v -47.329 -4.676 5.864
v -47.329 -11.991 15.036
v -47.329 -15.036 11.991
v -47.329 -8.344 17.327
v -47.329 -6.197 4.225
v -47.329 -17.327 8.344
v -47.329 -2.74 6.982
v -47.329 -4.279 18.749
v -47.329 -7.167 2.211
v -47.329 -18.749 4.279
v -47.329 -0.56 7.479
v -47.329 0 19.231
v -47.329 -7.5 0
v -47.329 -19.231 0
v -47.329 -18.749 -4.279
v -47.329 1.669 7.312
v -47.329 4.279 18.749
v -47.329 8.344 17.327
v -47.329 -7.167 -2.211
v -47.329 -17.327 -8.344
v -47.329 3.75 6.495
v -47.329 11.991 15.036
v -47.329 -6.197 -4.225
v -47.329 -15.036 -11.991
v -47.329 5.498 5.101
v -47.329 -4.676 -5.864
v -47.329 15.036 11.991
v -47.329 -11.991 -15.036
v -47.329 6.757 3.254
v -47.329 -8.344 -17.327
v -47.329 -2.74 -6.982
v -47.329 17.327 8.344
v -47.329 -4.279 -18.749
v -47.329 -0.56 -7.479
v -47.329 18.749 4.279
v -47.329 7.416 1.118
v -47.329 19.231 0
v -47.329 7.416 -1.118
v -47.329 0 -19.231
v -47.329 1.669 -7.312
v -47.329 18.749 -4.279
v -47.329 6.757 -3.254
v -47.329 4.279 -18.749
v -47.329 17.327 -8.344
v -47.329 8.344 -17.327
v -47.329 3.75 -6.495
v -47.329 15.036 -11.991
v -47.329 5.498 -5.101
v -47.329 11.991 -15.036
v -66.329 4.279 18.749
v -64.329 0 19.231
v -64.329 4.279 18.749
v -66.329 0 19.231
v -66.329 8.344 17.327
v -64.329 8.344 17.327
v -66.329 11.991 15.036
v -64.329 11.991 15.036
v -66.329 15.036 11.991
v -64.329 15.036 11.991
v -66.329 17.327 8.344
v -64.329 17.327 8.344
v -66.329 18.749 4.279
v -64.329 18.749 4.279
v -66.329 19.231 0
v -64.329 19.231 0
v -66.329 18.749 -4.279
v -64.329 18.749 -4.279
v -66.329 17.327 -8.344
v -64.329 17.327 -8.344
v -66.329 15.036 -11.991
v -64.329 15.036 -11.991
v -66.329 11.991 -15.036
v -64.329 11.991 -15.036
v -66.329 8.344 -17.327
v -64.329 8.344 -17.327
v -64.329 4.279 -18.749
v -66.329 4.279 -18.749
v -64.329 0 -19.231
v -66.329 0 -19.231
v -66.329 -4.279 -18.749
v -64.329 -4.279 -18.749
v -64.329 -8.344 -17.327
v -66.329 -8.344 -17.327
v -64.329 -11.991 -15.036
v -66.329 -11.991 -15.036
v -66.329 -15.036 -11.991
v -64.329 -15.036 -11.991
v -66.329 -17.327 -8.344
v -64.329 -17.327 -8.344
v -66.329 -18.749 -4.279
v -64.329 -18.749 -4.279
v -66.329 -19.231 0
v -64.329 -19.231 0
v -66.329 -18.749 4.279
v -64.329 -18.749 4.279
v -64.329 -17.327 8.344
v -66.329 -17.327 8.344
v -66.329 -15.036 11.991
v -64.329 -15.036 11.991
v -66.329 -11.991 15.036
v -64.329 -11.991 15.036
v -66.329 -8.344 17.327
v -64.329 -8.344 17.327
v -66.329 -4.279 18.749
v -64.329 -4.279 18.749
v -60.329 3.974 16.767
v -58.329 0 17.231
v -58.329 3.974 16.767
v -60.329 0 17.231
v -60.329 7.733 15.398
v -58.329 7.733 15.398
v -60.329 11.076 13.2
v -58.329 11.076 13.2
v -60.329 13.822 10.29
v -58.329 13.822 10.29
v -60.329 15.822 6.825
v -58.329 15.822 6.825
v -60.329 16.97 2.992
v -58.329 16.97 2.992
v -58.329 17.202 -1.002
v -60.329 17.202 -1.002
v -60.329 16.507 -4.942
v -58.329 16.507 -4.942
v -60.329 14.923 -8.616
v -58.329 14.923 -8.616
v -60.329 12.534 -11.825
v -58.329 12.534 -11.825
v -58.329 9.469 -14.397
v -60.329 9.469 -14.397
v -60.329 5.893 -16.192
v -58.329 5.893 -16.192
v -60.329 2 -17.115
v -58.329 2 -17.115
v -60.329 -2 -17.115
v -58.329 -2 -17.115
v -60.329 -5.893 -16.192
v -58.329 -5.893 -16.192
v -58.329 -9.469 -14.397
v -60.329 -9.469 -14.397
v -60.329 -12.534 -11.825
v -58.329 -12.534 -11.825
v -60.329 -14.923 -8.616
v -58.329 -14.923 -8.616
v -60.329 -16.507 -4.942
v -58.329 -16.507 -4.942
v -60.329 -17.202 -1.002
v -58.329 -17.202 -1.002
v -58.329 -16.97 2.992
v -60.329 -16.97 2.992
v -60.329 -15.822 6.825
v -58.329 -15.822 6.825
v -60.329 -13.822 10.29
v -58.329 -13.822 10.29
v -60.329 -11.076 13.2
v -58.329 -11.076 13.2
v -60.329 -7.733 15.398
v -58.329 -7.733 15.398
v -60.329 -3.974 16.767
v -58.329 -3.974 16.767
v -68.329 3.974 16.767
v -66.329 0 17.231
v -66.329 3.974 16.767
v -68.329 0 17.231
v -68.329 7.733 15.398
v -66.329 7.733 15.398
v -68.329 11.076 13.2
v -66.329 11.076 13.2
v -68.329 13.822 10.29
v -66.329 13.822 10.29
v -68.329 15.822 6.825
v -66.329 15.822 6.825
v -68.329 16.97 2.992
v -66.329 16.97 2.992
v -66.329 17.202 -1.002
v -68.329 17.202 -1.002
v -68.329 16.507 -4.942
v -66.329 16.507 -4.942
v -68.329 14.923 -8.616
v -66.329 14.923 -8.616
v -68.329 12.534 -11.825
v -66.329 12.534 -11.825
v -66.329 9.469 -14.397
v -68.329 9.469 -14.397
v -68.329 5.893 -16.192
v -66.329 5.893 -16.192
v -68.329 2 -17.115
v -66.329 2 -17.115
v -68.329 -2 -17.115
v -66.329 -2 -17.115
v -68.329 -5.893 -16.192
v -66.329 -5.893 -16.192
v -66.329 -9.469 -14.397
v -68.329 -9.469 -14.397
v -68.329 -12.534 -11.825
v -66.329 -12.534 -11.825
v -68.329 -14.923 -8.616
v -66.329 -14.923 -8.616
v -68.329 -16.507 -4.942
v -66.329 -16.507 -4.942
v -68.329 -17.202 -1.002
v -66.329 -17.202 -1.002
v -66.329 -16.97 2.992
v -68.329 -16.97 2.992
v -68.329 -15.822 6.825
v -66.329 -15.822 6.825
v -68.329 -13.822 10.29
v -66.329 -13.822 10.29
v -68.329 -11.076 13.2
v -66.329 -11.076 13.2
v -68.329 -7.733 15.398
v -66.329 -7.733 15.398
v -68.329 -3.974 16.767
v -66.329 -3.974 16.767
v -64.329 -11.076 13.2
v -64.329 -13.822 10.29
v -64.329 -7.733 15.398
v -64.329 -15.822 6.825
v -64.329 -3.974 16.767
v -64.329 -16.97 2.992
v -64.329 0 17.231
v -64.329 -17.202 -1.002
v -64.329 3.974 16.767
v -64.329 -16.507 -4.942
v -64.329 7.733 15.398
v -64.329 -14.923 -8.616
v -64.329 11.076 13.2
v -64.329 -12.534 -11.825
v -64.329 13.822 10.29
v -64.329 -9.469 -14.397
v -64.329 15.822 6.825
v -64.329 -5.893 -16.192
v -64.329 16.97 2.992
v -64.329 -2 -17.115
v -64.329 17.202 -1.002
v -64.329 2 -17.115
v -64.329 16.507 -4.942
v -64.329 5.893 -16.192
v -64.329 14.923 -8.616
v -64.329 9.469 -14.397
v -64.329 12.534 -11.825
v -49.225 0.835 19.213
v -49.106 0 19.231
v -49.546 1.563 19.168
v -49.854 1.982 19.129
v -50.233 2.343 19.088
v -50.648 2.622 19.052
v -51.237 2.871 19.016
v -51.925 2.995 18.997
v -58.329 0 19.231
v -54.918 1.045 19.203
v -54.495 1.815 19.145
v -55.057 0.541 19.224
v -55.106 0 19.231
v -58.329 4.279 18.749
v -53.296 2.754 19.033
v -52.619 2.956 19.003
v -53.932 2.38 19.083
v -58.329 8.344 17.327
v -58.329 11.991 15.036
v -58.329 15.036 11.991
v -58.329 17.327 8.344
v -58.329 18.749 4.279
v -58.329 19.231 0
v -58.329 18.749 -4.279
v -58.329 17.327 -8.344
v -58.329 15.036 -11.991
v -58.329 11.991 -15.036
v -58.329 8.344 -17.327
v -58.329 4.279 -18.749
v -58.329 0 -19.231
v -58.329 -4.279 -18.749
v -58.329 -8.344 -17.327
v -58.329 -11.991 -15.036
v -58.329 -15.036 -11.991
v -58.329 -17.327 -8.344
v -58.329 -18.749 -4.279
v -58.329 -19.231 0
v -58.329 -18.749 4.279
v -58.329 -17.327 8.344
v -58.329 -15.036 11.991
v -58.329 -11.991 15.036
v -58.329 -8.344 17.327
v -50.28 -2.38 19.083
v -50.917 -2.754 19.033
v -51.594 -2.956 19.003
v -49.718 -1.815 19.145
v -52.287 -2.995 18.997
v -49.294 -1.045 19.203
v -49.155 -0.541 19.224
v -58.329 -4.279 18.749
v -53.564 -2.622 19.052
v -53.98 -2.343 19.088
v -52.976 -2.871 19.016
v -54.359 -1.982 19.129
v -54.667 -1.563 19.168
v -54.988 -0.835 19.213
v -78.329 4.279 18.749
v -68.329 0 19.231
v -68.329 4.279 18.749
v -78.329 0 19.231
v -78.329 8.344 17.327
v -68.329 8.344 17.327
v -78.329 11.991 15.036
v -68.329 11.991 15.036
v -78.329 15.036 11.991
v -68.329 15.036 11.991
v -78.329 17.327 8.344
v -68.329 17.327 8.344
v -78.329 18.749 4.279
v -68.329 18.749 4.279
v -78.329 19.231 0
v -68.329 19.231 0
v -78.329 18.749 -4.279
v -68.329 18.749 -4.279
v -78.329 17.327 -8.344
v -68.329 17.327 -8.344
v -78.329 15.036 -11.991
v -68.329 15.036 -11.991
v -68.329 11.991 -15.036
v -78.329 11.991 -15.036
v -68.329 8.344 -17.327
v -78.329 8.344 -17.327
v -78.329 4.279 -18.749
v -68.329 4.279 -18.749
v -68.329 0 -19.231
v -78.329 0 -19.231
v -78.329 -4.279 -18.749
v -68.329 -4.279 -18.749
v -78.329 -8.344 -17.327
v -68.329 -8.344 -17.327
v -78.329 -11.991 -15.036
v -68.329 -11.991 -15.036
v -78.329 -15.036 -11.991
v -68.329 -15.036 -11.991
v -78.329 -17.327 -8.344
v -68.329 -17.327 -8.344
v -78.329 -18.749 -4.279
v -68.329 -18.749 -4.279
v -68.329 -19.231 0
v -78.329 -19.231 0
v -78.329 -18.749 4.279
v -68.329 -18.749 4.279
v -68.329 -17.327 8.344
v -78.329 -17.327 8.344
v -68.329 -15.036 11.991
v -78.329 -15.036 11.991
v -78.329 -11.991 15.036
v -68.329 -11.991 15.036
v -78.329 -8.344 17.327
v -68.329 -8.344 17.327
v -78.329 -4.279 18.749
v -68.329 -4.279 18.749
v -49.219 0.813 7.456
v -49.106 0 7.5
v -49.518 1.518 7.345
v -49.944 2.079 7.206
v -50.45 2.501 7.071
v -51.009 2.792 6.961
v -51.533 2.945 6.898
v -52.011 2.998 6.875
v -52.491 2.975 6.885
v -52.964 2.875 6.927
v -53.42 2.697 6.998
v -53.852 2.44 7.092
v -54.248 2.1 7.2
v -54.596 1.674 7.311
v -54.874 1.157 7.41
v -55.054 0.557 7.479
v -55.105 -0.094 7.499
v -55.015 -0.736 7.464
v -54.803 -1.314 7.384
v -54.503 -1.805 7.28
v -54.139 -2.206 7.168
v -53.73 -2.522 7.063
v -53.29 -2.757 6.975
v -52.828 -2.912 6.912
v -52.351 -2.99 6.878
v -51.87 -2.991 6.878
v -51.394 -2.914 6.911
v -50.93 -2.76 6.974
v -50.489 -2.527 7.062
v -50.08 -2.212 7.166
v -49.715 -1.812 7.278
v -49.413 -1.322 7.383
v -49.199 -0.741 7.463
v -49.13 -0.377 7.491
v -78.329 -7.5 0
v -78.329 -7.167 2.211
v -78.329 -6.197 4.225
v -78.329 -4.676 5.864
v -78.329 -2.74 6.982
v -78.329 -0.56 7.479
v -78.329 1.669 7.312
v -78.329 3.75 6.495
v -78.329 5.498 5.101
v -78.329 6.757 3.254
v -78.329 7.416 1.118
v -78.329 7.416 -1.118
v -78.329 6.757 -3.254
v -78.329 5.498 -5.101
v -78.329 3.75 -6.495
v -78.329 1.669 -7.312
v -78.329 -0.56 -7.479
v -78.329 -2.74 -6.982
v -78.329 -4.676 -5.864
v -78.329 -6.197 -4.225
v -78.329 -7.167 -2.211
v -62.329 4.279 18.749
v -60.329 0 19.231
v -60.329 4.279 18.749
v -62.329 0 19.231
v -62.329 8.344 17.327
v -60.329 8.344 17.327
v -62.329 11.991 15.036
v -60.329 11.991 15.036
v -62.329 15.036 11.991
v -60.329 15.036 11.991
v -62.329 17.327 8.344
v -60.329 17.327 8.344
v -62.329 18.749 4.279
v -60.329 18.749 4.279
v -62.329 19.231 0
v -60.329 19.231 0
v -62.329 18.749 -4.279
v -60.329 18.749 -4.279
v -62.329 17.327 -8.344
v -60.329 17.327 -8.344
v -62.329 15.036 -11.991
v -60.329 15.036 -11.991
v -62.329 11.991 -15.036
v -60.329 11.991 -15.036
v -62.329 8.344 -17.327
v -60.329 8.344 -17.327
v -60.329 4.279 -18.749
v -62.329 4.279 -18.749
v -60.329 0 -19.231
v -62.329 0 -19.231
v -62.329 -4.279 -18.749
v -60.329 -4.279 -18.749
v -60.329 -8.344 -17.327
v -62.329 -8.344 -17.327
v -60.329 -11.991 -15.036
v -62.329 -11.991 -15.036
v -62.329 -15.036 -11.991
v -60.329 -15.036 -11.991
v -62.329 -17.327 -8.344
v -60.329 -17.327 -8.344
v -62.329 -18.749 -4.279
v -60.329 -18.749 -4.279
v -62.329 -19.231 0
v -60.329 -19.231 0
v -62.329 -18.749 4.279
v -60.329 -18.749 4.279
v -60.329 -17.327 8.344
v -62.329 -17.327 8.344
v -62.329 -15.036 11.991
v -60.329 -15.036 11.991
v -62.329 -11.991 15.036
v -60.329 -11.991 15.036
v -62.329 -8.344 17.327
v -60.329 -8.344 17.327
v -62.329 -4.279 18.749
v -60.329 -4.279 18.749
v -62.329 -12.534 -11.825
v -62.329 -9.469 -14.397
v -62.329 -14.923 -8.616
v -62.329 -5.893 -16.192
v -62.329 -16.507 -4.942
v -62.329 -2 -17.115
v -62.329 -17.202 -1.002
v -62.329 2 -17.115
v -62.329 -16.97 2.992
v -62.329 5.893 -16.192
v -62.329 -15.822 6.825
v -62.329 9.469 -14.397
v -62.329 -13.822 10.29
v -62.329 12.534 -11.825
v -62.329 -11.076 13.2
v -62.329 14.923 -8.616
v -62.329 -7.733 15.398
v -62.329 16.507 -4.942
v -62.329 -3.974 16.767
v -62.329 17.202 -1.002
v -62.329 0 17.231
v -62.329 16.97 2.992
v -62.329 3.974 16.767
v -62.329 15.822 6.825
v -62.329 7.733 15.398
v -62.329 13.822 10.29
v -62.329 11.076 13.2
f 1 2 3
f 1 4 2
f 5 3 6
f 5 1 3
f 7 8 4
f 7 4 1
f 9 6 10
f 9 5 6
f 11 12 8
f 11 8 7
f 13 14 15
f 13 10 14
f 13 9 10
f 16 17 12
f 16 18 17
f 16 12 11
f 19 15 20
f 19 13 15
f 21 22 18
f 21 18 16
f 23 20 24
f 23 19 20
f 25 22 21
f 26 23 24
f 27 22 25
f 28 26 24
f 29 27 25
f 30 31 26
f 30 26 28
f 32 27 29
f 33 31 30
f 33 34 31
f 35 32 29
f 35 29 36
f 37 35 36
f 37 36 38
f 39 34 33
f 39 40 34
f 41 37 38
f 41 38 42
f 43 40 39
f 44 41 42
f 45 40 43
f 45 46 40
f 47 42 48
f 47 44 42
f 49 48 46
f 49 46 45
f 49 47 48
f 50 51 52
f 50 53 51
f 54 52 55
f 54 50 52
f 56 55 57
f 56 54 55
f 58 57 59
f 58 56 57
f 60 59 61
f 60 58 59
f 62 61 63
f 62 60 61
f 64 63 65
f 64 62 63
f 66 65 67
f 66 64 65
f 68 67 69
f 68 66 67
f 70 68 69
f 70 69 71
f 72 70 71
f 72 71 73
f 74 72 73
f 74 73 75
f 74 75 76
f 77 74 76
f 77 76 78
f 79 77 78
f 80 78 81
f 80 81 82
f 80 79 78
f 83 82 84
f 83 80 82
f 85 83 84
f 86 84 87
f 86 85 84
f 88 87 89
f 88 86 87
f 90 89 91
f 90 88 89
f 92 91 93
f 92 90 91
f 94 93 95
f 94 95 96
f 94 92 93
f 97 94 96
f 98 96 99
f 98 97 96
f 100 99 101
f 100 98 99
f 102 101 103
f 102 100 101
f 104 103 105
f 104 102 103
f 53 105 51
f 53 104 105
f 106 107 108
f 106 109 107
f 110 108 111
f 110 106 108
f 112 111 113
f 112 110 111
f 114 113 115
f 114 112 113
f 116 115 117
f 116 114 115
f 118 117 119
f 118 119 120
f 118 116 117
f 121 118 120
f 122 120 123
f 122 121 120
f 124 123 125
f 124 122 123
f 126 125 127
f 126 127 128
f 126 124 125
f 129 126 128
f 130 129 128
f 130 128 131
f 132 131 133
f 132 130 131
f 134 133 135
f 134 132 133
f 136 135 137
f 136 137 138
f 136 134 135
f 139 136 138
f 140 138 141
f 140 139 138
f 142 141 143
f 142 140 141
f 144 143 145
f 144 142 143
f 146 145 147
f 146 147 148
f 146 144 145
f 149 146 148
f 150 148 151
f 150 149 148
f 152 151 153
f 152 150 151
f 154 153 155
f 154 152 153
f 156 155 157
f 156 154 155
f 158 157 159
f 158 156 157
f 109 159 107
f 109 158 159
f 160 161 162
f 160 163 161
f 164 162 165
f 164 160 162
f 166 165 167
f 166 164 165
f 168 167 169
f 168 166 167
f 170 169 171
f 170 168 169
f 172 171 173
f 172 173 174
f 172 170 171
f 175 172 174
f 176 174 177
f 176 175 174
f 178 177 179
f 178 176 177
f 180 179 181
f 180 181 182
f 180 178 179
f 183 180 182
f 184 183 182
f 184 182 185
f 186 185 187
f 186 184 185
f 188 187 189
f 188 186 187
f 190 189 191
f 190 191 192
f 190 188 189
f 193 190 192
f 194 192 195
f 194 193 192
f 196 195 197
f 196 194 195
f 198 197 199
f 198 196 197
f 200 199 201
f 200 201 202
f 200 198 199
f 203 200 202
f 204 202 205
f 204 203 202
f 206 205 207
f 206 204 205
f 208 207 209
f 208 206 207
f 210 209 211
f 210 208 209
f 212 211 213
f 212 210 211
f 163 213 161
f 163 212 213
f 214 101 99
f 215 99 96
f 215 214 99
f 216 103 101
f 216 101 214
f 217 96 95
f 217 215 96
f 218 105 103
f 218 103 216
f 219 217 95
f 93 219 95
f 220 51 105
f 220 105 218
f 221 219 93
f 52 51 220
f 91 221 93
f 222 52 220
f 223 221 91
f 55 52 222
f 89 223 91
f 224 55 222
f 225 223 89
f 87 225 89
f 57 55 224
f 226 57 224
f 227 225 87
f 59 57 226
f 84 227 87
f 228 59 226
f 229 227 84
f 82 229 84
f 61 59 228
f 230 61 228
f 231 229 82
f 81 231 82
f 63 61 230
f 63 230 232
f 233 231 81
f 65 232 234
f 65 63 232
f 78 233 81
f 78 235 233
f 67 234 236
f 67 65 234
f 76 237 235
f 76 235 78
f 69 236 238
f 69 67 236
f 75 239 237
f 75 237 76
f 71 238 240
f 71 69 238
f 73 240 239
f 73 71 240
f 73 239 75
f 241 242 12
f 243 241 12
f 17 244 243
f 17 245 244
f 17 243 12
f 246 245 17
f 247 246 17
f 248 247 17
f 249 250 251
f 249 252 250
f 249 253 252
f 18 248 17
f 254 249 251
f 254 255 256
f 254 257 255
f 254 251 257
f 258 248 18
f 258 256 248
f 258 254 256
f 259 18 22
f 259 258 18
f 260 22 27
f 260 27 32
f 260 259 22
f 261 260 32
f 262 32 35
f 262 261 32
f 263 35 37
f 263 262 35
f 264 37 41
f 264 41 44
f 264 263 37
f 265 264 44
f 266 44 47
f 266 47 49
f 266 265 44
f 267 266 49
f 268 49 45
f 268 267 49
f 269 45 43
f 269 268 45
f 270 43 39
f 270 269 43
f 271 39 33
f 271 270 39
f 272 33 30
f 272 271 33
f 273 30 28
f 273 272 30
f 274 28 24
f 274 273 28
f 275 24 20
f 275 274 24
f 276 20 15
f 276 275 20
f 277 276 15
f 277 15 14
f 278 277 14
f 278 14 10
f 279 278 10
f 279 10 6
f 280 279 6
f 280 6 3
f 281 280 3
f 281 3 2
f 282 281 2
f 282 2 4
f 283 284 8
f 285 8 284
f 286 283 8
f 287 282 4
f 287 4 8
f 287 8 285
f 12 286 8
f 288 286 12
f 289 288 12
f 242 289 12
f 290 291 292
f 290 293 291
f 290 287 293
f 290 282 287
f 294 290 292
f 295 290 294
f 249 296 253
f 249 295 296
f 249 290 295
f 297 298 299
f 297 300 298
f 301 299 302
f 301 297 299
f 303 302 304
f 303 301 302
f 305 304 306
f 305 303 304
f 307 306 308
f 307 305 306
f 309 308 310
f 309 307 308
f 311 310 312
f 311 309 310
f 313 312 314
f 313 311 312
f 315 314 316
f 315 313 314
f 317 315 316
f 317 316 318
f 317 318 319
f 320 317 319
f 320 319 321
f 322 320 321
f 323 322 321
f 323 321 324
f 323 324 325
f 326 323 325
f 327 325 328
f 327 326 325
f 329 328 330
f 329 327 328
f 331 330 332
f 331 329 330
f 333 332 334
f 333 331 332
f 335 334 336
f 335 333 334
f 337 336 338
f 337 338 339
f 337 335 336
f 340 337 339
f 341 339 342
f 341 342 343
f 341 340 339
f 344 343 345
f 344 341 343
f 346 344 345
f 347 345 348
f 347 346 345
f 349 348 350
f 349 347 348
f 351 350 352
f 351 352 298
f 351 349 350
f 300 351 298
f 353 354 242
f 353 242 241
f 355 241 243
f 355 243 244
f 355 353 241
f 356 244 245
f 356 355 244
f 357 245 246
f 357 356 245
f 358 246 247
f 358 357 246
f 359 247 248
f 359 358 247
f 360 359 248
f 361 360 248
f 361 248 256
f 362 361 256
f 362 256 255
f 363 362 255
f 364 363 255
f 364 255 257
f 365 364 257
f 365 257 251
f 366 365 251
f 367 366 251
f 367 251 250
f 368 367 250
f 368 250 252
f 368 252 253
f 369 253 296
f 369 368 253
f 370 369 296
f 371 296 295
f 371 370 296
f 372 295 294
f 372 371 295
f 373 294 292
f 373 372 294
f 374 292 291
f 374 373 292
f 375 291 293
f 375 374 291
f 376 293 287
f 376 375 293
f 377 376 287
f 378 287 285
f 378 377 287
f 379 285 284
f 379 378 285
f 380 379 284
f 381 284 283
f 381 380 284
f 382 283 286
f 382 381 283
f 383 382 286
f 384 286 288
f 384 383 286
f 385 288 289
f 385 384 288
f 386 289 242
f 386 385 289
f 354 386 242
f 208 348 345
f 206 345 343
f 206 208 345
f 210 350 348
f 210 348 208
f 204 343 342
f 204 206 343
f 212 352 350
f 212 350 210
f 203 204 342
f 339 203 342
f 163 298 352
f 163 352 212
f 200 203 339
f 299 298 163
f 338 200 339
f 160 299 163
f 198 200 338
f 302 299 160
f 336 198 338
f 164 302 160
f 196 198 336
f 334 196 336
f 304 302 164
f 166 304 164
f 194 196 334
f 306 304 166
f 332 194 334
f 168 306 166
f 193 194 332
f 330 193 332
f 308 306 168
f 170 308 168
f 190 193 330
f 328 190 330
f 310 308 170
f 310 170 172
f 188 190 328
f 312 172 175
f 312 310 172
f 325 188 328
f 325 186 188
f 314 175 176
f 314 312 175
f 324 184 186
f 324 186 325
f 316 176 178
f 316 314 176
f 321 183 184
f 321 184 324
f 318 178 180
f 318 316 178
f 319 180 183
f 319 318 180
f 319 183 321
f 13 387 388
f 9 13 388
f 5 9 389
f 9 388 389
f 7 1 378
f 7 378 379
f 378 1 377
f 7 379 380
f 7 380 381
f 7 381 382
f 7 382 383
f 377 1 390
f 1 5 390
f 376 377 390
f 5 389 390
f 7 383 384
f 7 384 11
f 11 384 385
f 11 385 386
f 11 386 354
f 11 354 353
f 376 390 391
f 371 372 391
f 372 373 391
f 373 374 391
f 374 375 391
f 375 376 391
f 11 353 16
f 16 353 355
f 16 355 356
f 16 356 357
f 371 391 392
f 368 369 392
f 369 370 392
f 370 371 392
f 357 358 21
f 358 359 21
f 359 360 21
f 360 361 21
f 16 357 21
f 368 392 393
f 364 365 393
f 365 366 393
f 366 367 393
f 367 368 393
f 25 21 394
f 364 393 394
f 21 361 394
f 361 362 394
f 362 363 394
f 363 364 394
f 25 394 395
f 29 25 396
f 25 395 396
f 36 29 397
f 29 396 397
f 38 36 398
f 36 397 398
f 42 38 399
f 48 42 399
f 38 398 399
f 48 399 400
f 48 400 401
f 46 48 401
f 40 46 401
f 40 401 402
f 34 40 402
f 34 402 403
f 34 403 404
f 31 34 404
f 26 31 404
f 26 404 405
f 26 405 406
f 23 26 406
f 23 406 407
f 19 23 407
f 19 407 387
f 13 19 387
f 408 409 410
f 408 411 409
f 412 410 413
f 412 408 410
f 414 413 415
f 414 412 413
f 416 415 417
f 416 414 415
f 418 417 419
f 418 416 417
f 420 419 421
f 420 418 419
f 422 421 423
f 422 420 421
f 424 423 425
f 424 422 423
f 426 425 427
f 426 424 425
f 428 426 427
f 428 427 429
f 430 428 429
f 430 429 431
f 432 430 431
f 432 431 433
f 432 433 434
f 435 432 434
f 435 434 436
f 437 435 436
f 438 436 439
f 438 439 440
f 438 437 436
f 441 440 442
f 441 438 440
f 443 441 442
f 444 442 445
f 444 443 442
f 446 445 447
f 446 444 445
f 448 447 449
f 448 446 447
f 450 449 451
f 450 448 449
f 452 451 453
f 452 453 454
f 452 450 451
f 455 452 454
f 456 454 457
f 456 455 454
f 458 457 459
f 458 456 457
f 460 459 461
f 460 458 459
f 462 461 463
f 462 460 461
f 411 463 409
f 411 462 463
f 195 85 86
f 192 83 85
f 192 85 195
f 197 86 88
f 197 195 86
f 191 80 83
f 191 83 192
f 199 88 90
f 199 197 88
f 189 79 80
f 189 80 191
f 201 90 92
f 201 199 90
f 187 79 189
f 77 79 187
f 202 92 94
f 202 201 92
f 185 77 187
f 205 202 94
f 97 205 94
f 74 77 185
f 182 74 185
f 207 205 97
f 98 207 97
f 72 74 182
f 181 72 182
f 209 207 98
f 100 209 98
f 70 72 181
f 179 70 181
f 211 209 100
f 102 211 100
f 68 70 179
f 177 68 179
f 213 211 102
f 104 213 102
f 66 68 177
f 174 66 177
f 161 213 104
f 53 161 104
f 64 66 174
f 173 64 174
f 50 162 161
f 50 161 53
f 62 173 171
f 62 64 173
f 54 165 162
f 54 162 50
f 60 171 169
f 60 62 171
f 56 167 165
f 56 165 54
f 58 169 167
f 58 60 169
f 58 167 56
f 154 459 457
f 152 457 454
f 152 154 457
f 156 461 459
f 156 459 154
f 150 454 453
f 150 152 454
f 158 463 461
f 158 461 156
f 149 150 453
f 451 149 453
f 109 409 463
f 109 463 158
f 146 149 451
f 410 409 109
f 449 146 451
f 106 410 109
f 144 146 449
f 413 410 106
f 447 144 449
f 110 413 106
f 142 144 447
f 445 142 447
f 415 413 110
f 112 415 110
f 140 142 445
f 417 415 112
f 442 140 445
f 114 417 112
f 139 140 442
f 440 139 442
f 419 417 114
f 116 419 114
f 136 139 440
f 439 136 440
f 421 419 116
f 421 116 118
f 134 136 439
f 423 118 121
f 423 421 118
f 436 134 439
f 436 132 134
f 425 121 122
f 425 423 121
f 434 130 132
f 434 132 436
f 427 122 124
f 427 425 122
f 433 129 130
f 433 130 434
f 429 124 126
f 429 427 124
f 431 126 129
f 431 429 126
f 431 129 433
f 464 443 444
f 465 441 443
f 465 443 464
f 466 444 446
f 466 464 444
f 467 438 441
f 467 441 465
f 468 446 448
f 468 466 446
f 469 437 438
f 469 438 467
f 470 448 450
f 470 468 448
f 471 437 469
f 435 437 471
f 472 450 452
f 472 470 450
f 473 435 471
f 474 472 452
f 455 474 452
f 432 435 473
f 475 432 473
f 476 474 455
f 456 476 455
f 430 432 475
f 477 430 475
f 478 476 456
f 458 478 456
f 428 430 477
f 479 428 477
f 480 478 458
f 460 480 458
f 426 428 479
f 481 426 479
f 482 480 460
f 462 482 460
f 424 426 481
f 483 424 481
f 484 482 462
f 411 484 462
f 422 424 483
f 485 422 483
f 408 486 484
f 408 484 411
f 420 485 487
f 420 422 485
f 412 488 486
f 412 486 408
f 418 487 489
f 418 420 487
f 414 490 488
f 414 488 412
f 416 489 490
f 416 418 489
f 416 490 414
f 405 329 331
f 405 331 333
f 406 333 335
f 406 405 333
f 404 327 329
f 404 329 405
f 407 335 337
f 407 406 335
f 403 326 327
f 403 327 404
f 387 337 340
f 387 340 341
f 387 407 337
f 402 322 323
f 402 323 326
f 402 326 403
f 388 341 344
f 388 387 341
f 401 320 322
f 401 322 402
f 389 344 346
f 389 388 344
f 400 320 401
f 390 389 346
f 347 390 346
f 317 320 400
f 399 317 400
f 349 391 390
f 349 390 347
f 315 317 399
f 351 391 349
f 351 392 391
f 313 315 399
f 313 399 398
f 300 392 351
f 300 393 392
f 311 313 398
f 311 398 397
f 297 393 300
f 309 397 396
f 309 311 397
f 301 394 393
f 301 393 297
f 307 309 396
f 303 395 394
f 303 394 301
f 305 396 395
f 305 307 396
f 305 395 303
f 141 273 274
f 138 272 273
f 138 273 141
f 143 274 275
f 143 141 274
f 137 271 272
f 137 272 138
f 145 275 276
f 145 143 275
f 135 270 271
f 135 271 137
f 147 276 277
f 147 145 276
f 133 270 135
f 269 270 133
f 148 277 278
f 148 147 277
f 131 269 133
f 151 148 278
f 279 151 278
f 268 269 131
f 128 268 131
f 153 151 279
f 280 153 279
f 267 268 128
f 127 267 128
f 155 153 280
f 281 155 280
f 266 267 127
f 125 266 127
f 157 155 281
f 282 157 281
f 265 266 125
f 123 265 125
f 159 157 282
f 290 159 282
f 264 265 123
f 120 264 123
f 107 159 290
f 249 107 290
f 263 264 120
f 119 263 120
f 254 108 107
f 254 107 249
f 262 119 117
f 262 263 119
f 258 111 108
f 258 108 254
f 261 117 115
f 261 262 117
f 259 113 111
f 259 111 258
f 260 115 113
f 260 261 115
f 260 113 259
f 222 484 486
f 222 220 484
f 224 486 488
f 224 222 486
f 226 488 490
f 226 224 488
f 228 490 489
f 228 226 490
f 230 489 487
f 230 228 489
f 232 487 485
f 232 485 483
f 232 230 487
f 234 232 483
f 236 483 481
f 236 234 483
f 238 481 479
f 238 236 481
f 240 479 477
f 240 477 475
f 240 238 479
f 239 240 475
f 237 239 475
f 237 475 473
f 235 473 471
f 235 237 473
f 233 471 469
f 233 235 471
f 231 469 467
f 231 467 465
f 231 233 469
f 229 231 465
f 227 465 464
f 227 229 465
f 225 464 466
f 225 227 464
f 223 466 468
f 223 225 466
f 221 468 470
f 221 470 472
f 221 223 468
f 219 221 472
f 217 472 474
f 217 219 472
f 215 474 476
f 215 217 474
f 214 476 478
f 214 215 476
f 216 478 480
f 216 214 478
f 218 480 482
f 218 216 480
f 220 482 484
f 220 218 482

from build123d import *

# Parameters (mm, degrees)
F2_R     = 7.5
F3_DEPTH = 40
F4_R     = 3
F5_DEPTH = 25


with BuildPart() as f1:
    # F0 (on Front) → F1 (revolve)
    with BuildSketch(Plane.XZ):
        Polygon((-78.328885, 0), (-47.328885, 0), (-47.328885, 19.231284), (-58.328885, 19.231284), (-58.328885, 17.231284), (-60.328885, 17.231284), (-60.328885, 19.231284), (-62.328885, 19.231284), (-62.328885, 17.231284), (-64.328885, 17.231284), (-64.328885, 19.231284), (-66.328885, 19.231284), (-66.328885, 17.231284), (-68.328885, 17.231284), (-68.328885, 19.231284), (-78.328885, 19.231284), align=None)
    revolve(axis=Axis((-39.164443, 0, 0), (-1, 0, 0)))

    # F2 (on face) → F3 (cut)
    with BuildSketch(Plane(origin=(-78.328885, 0, 0), x_dir=(0, -1, 0), z_dir=(-1, 0, 0))):
        Circle(F2_R)
    extrude(amount=-F3_DEPTH, mode=Mode.SUBTRACT)

    # F4 (on Top) → F5 (cut)
    with BuildSketch(Plane.XY):
        with Locations((-52.106317, 0)):
            Circle(F4_R)
    extrude(amount=F5_DEPTH, mode=Mode.SUBTRACT)


solid = f1.part
